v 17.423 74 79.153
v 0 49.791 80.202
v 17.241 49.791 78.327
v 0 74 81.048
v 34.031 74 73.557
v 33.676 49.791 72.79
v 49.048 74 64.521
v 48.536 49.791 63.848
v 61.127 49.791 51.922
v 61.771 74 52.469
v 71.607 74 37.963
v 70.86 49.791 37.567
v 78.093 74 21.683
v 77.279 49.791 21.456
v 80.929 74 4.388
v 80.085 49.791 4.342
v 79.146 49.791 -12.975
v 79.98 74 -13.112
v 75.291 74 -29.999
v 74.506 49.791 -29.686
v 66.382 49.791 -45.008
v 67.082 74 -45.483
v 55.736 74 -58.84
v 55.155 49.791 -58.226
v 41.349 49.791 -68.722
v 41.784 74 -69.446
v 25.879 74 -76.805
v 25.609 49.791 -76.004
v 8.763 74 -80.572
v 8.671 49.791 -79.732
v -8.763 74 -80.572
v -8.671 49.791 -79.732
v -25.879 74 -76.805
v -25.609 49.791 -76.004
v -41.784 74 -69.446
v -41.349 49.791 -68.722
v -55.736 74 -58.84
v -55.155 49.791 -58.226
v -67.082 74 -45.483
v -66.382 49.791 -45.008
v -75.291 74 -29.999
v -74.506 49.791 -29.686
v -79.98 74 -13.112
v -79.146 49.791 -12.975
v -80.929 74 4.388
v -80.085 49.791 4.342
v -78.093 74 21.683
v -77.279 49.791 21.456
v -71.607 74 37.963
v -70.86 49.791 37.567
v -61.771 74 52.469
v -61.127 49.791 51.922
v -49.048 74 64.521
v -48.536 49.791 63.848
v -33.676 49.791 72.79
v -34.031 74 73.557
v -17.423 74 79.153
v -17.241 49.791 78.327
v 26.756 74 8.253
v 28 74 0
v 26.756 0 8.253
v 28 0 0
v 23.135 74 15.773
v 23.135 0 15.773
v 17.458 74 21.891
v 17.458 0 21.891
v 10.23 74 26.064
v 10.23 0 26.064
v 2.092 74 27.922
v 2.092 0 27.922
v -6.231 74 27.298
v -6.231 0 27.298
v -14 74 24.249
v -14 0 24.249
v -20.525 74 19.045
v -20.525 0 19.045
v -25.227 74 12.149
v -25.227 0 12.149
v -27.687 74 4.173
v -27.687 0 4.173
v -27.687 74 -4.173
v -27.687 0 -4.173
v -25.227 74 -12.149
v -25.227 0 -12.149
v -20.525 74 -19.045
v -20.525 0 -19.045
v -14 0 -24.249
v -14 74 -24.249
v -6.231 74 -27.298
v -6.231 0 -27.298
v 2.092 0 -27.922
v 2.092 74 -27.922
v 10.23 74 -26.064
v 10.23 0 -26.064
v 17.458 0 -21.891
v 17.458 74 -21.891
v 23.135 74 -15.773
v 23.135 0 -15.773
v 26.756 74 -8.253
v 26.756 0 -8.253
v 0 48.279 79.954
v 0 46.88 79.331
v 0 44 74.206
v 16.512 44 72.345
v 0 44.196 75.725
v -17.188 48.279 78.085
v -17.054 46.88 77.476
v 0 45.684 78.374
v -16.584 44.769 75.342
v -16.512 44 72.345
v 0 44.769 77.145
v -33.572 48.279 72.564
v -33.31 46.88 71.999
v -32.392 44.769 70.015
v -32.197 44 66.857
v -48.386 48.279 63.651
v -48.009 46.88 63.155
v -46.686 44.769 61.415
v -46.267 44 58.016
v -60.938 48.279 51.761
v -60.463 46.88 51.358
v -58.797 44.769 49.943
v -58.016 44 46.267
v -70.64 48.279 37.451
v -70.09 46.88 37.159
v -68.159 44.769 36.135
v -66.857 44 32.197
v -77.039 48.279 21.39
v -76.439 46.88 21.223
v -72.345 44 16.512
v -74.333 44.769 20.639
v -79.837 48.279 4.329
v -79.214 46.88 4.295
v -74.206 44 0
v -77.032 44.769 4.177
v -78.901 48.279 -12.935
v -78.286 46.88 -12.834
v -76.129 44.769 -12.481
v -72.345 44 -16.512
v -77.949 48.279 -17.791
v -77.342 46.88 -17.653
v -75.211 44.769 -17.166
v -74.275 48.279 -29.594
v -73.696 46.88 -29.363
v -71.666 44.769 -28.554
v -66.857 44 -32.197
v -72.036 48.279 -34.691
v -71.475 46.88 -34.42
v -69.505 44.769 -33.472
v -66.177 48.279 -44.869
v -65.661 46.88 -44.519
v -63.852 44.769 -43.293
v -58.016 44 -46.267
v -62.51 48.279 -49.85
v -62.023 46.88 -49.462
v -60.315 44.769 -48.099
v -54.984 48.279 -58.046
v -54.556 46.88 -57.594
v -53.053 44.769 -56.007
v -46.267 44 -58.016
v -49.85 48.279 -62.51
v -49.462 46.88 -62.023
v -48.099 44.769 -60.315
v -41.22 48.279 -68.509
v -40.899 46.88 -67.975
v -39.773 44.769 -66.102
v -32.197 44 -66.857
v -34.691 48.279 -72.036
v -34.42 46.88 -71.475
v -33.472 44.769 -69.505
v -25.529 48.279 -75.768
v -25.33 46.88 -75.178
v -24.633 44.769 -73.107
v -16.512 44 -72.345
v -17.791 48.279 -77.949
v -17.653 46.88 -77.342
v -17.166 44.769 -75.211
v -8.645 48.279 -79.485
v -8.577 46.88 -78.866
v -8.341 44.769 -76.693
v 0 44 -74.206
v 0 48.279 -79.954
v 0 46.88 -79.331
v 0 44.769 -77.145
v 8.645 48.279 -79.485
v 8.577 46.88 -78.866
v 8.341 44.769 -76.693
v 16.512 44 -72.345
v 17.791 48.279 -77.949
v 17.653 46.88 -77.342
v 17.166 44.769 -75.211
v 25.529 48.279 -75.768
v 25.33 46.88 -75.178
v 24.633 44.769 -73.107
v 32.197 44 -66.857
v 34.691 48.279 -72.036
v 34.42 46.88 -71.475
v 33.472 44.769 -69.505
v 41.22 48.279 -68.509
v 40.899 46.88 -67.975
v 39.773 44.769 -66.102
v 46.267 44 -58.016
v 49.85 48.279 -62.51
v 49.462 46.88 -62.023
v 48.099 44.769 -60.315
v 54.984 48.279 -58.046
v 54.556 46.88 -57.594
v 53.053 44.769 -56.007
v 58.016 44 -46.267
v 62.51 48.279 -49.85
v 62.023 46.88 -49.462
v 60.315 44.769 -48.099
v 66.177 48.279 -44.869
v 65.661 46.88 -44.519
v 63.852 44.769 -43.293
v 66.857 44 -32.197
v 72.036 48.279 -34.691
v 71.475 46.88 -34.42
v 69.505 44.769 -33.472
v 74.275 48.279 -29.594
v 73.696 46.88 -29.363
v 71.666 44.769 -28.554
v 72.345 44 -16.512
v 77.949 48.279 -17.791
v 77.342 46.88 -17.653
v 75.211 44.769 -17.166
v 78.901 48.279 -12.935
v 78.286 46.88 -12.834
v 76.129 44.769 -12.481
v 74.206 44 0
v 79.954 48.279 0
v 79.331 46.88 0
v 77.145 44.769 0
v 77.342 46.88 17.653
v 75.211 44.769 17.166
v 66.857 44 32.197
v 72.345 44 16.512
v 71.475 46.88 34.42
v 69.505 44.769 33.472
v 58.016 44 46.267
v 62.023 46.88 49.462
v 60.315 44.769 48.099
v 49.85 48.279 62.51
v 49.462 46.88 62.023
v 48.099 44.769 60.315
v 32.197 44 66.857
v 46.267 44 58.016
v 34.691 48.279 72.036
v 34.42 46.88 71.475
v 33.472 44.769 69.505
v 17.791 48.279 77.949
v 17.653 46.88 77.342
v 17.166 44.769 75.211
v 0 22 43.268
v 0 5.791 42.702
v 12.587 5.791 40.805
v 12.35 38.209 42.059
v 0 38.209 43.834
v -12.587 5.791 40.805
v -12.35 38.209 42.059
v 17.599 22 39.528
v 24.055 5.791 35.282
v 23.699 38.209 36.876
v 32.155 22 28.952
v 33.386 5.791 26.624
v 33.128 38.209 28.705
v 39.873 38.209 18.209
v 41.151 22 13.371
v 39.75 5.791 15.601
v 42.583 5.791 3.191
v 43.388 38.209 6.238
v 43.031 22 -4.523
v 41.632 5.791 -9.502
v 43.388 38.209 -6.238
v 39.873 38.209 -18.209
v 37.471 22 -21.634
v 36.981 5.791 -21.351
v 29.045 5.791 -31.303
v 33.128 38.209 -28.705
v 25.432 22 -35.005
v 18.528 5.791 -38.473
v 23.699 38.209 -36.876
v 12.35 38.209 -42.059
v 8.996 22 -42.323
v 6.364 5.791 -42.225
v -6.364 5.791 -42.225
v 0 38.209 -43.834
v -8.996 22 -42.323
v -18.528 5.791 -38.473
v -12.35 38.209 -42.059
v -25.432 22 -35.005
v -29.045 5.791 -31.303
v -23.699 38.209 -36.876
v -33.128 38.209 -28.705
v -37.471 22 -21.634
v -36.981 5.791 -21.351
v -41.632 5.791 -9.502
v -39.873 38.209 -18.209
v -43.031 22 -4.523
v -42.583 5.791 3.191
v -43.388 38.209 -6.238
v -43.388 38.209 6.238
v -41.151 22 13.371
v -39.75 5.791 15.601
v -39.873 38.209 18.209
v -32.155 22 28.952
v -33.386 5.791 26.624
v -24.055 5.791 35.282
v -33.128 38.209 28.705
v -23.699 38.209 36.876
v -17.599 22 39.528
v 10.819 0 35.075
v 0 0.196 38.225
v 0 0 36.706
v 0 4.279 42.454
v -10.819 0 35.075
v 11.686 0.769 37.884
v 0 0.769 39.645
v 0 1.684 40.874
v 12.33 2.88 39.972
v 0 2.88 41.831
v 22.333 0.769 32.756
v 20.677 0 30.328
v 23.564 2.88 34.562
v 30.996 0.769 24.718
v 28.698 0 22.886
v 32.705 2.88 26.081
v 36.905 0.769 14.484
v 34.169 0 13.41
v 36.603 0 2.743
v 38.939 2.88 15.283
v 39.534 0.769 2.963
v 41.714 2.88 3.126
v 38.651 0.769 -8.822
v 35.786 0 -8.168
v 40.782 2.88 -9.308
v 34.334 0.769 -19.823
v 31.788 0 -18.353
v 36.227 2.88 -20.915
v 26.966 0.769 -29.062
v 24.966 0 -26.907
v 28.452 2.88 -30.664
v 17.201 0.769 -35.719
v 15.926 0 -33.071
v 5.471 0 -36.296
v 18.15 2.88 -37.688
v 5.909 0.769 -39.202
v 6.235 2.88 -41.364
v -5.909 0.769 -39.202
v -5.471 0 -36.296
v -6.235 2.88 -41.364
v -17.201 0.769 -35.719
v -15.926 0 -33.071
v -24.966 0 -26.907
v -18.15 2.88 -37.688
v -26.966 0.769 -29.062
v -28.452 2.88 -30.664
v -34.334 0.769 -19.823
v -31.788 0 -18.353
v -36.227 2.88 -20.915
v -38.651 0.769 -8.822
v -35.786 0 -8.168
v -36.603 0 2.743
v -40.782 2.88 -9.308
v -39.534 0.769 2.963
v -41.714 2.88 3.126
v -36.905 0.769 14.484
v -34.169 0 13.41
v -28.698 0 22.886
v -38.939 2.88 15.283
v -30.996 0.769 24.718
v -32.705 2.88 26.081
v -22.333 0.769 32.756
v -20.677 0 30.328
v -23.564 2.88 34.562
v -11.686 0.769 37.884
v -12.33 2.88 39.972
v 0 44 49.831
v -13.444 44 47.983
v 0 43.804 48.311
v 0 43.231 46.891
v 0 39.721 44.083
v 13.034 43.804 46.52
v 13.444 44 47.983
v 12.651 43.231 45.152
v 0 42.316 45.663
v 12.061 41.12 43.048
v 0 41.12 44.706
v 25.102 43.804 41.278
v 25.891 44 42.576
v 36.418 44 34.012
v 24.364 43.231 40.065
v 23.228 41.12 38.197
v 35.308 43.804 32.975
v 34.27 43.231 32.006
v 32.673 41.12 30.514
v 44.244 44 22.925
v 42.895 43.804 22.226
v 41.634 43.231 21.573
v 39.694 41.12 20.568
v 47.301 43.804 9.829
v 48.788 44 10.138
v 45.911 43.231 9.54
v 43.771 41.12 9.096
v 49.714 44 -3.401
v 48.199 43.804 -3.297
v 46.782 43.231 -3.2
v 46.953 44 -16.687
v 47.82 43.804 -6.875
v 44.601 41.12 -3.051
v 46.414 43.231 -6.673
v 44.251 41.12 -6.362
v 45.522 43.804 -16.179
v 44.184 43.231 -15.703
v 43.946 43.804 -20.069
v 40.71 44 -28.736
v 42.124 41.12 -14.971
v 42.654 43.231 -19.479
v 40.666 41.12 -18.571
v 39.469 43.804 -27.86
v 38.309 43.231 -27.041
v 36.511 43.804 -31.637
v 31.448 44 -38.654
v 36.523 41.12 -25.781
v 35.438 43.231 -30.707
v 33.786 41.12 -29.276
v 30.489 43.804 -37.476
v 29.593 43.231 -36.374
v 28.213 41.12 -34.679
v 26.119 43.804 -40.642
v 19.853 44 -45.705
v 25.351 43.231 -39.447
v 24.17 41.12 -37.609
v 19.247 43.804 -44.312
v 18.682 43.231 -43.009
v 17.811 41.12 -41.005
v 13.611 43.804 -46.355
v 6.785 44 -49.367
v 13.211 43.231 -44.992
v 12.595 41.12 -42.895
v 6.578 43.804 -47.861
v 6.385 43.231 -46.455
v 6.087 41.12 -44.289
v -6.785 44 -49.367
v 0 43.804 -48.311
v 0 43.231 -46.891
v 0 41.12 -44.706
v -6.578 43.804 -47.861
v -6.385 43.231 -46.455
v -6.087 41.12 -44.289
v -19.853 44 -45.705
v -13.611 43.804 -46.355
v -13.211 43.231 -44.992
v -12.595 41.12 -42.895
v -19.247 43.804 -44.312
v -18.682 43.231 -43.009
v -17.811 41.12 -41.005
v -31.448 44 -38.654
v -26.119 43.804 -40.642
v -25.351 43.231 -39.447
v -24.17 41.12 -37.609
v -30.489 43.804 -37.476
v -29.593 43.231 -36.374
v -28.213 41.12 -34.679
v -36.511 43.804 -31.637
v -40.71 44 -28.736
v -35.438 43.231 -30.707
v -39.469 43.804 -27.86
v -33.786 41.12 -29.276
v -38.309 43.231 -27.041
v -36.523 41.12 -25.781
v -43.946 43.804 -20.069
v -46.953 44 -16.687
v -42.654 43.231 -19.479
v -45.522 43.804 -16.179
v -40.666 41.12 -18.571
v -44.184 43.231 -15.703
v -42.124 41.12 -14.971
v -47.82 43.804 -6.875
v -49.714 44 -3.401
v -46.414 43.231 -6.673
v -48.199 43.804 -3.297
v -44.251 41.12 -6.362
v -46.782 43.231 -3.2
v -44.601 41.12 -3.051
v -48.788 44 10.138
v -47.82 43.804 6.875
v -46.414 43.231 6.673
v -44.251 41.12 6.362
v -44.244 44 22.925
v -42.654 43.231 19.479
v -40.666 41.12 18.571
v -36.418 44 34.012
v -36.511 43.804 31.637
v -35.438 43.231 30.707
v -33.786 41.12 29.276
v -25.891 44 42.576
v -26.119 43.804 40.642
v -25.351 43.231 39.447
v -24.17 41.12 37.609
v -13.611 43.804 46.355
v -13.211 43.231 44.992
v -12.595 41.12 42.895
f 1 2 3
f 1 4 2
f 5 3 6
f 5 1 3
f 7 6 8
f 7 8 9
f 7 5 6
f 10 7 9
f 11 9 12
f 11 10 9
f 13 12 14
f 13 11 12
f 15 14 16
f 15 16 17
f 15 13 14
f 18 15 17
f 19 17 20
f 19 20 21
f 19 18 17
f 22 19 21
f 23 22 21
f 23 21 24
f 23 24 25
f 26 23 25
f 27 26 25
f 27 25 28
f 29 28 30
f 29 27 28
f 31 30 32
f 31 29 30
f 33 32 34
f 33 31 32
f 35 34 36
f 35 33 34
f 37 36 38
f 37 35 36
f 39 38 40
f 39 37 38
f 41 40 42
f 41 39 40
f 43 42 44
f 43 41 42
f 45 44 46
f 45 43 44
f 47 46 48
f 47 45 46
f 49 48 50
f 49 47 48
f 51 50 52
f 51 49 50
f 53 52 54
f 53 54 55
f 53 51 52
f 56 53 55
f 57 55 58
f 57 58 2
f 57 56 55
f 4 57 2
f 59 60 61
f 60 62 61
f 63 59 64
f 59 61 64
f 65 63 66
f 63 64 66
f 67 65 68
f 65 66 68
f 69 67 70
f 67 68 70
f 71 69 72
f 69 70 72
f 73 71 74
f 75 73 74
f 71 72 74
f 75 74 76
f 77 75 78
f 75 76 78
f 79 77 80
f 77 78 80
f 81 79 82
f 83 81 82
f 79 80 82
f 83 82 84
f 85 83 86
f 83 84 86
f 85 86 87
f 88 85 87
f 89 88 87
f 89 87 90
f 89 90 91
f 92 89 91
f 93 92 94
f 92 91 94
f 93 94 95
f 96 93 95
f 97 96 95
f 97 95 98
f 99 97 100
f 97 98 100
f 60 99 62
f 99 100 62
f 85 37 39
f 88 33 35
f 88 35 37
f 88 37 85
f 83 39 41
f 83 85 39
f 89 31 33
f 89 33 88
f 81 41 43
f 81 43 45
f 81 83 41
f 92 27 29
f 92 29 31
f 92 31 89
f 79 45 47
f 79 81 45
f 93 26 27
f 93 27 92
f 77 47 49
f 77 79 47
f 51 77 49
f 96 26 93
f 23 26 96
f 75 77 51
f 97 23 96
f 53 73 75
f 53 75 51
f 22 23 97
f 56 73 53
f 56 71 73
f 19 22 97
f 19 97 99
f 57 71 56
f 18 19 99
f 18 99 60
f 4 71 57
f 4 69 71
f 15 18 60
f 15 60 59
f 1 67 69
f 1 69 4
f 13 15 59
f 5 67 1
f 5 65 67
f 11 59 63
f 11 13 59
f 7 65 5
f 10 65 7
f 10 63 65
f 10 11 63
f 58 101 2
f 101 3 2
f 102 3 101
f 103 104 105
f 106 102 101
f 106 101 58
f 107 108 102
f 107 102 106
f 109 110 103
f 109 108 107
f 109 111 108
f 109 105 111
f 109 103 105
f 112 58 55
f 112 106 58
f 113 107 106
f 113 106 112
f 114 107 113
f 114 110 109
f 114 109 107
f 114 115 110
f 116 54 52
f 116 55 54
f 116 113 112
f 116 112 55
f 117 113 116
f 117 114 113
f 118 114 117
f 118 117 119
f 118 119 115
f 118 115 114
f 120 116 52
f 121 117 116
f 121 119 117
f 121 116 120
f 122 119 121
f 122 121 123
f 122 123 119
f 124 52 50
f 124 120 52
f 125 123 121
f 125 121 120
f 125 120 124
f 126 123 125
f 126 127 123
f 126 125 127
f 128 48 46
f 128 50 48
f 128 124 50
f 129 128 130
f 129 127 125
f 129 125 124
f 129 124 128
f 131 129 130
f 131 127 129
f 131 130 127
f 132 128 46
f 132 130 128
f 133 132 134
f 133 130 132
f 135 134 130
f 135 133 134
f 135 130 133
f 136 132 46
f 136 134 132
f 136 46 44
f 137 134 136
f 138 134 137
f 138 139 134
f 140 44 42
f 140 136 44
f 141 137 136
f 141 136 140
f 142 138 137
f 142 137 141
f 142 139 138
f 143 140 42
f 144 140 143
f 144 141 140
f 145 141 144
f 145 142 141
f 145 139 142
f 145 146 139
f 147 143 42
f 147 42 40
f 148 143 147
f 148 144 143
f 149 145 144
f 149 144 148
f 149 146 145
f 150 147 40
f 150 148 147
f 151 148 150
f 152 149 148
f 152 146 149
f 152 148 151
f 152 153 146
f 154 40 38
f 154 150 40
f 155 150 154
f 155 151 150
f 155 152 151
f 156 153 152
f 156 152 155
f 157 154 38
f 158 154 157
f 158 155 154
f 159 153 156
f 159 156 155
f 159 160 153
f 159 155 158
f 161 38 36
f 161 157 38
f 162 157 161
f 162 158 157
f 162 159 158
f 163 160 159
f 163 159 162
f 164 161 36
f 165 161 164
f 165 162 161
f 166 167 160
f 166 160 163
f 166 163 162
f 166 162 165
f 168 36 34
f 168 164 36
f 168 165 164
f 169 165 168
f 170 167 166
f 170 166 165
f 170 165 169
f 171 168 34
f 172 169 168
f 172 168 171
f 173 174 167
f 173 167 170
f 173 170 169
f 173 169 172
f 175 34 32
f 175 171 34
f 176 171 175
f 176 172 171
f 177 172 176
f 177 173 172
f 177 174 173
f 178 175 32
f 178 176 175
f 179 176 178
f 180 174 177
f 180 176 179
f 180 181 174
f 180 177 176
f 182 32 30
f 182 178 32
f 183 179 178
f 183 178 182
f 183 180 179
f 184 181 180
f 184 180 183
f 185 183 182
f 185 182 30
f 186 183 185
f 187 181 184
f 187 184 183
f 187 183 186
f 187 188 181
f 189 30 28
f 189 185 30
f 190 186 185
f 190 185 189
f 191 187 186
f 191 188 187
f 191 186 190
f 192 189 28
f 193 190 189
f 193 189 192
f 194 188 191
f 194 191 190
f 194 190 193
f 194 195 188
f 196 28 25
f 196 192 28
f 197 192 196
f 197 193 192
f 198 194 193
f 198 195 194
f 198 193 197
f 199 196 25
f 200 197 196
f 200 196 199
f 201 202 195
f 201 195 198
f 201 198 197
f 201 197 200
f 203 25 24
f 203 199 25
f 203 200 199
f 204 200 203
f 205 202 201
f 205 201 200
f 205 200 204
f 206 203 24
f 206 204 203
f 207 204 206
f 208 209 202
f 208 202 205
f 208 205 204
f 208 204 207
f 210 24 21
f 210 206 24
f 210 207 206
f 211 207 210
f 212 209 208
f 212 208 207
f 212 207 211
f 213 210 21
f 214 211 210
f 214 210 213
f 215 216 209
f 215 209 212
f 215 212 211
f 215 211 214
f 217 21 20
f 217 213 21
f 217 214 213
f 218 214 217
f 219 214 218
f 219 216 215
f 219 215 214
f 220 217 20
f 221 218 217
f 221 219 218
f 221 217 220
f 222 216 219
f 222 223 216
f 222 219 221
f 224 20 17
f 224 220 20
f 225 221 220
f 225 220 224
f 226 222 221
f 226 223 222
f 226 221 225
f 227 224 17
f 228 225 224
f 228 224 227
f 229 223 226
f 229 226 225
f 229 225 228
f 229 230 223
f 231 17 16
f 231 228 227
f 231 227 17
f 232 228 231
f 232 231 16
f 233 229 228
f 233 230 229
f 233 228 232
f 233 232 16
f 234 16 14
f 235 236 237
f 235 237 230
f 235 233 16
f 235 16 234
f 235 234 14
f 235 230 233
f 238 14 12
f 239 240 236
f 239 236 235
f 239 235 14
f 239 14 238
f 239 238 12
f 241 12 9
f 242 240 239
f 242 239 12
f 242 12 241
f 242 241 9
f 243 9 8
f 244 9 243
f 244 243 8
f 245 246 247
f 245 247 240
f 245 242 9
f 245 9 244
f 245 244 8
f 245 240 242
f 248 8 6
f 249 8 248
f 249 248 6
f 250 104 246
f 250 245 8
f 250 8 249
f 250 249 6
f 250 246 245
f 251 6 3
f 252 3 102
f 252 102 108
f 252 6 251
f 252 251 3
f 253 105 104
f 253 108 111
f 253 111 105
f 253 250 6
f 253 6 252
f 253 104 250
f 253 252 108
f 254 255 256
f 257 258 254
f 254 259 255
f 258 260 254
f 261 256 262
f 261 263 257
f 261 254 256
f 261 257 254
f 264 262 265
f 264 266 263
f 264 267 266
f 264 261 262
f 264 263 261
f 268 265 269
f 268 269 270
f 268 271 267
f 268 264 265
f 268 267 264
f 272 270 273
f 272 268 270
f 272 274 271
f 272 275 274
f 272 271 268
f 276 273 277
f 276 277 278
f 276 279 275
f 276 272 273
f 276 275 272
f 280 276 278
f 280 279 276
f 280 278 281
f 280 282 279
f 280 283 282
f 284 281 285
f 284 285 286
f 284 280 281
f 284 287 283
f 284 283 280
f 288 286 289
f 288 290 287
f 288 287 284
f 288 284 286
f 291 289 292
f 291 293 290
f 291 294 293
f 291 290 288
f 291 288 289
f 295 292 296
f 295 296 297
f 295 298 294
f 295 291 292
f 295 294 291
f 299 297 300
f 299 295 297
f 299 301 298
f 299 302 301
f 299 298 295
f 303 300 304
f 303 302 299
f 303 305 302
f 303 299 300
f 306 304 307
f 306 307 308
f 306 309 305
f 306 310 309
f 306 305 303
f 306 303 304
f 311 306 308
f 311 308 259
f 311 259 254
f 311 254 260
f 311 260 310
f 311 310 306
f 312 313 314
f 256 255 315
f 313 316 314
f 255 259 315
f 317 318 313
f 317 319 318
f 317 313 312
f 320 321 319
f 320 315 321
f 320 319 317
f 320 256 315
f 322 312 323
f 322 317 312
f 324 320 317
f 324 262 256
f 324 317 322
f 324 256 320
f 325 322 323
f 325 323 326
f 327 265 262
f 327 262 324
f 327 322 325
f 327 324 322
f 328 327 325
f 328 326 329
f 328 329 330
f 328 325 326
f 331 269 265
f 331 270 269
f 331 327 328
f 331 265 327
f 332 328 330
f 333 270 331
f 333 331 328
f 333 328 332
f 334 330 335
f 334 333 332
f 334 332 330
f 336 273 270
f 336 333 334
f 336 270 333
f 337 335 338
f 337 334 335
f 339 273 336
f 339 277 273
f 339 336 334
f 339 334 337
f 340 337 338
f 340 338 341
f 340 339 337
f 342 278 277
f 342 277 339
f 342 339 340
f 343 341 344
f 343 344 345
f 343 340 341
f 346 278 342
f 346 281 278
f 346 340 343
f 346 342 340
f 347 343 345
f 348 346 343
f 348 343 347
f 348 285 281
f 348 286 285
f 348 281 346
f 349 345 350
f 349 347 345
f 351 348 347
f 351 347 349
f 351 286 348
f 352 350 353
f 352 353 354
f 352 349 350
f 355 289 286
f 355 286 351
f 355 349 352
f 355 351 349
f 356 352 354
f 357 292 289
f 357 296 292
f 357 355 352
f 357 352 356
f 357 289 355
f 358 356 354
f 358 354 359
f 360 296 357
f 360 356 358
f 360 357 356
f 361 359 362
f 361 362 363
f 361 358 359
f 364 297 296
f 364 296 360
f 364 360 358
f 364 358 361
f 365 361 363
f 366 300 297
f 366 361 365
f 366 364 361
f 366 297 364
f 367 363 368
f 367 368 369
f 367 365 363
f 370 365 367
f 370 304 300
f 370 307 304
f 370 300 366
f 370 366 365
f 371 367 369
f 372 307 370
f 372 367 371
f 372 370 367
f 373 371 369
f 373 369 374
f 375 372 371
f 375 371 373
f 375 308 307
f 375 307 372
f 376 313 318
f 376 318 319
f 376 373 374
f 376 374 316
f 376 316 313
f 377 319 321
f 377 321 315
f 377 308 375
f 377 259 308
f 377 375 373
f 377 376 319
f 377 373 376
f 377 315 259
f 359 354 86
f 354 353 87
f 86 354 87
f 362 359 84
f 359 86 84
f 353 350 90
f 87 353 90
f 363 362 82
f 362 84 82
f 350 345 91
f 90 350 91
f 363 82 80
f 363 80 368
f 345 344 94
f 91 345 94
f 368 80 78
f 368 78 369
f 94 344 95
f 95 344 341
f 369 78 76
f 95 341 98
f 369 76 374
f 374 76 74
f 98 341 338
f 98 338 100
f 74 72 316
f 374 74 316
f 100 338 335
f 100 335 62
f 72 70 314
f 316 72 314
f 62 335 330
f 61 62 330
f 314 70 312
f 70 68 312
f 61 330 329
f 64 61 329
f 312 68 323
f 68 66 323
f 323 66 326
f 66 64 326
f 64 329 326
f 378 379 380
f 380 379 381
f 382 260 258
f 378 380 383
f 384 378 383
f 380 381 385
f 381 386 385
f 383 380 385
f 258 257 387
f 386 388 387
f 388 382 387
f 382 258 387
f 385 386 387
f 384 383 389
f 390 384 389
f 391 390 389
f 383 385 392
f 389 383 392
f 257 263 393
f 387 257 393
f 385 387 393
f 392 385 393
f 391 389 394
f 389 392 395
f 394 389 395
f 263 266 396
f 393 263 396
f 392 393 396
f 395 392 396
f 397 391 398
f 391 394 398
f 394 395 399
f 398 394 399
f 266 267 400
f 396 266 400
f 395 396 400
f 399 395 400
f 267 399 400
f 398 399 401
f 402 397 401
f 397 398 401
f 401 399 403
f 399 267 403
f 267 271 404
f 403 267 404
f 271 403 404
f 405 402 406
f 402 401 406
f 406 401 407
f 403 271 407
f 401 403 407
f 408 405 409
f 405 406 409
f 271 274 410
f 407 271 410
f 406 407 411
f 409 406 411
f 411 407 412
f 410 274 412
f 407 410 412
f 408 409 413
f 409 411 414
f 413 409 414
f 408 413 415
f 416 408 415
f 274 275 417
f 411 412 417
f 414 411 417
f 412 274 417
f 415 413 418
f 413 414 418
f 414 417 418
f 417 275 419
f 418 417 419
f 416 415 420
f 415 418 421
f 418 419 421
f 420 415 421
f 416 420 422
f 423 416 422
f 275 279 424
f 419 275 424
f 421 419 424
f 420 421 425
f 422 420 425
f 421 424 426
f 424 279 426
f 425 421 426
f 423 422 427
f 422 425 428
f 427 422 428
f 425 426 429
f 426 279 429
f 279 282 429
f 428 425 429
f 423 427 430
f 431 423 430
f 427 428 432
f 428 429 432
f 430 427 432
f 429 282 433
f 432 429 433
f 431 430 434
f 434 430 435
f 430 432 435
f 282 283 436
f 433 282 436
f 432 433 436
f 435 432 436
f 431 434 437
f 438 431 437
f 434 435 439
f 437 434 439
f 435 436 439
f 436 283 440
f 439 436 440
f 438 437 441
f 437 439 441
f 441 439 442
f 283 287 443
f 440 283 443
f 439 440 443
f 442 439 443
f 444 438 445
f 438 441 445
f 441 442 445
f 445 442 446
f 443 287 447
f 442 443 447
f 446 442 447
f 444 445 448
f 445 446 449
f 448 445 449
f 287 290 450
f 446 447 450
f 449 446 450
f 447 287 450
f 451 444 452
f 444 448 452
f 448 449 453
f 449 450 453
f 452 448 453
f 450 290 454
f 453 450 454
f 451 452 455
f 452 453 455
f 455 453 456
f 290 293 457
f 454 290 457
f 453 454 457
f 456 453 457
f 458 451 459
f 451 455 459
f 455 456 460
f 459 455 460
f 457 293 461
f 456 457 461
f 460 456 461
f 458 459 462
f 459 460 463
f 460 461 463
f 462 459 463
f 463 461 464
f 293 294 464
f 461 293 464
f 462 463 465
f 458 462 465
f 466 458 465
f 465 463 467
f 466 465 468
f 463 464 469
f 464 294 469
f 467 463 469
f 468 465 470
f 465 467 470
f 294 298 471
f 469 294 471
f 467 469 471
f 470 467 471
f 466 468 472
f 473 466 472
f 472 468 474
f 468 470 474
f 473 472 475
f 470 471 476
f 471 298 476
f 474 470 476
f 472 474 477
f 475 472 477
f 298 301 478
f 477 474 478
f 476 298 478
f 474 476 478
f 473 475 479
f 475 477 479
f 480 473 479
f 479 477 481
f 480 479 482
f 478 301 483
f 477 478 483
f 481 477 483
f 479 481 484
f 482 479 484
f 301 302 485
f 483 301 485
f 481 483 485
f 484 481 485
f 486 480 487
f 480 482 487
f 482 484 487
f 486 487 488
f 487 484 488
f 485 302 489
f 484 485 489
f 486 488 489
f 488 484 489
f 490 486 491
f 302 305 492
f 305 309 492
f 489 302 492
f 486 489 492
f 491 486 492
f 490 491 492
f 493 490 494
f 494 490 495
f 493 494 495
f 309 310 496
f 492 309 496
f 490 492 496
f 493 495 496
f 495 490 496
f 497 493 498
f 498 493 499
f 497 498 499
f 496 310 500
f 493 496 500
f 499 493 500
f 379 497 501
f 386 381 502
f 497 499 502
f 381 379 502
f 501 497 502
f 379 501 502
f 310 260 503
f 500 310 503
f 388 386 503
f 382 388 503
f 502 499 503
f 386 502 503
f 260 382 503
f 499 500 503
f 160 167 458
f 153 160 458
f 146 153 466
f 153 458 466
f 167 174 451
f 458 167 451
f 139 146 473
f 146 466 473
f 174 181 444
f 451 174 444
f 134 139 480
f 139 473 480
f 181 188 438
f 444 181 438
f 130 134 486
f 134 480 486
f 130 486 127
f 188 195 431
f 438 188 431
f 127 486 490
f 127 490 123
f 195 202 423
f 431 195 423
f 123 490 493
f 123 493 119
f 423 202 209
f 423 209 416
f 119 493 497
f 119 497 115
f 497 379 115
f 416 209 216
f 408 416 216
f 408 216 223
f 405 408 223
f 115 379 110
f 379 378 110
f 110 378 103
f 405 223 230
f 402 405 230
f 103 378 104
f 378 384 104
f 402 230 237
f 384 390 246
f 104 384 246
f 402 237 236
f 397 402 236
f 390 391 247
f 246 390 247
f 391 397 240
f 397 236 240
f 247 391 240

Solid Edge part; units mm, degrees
sketch "Sketch1" plane through (0, 0, 0) normal (1, 0, 0) x (0, 1, 0)
  line L0 (74, 81.0476) -> (74, 0)
  line L1 (44, 80) -> (74, 81.0476)
  line L2 (44, 80) -> (44, 44.0365)
  line L3 (0, 42.5) -> (44, 44.0365)
  line L4 (0, 42.5) -> (0, 0)
  dimension "D1" = 42.5
  dimension "D2" = 35.9635
  dimension "D3" = 81.0476
  dimension "D4" = 30.0183
  dimension "D5" = 44.0268
revolve "RevolvedProtrusion1" add sketch "Sketch1" angle 360 about axis through (0, 0, 0) along (0, 1, 0)
sketch "Sketch2" plane through (0, 0, 0) normal (0, -1, 0) x (1, 0, 0)
  circle A0 centre (0, 0) radius 28
extrude "Cutout1" cut sketch "Sketch2" against normal blind 250.3843
fillet "Raccordi" radius 6 3 edges at (0, 0, 42.5) (0, 44, 44.0365) (0, 44, 80)
properties material "Acciaio"
